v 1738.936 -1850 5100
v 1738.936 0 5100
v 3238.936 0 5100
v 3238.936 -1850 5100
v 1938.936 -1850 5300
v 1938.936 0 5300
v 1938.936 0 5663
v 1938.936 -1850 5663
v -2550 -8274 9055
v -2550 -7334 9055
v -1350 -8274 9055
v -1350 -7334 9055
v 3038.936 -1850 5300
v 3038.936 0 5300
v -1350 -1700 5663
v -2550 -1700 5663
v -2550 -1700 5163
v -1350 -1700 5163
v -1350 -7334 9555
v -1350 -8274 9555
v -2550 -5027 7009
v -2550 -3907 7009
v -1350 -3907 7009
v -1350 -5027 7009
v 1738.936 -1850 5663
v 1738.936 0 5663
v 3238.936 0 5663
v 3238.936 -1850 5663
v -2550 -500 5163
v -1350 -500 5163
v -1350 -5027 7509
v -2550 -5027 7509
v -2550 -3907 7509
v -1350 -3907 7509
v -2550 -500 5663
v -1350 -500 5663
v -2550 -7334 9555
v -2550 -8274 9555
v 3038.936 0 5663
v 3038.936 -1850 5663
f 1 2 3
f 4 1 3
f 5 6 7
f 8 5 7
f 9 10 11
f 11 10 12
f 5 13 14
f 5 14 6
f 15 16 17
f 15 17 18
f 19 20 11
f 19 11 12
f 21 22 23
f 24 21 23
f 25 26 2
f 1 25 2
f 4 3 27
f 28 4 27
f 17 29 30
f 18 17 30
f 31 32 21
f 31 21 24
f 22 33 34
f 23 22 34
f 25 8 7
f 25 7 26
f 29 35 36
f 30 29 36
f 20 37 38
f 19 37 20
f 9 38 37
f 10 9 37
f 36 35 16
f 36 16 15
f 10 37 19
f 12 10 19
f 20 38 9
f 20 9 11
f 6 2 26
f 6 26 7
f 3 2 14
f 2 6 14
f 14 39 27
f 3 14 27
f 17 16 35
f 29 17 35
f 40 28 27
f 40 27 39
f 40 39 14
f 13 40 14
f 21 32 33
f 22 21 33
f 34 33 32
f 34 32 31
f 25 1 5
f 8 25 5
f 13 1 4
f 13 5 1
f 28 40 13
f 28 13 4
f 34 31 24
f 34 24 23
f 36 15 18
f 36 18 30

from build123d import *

# Parameters (mm, degrees)
F3_W      = 1200
F3_H      = 1200
F4_DEPTH  = 500
F5_W      = 1200
F5_H      = 1120
F6_DEPTH  = 500
F7_W      = 1200
F7_H      = 940
F8_DEPTH  = 500
F10_DEPTH = 1850


with BuildPart() as f4:
    # F3 (on offset) → F4 (new body)
    with BuildSketch(Plane.XY.offset(5663)):
        with Locations((-1950, -1100)):
            Rectangle(F3_W, F3_H)
    extrude(amount=-F4_DEPTH)


with BuildPart() as f6:
    # F5 (on offset) → F6 (new body)
    with BuildSketch(Plane.XY.offset(7509)):
        with Locations((-1950, -4467)):
            Rectangle(F5_W, F5_H)
    extrude(amount=-F6_DEPTH)


with BuildPart() as f8:
    # F7 (on offset) → F8 (new body)
    with BuildSketch(Plane.XY.offset(9555)):
        with Locations((-1950, -7804)):
            Rectangle(F7_W, F7_H)
    extrude(amount=-F8_DEPTH)


with BuildPart() as f10:
    # F9 (on Front) → F10 (new body)
    with BuildSketch(Plane.XZ):
        Polygon((1938.936245, 5663), (1738.936245, 5663), (1738.936245, 5100), (3238.936245, 5100), (3238.936245, 5663), (3038.936245, 5663), (3038.936245, 5300), (1938.936245, 5300), align=None)
    extrude(amount=F10_DEPTH)


solid = Compound([f4.part, f6.part, f8.part, f10.part])
